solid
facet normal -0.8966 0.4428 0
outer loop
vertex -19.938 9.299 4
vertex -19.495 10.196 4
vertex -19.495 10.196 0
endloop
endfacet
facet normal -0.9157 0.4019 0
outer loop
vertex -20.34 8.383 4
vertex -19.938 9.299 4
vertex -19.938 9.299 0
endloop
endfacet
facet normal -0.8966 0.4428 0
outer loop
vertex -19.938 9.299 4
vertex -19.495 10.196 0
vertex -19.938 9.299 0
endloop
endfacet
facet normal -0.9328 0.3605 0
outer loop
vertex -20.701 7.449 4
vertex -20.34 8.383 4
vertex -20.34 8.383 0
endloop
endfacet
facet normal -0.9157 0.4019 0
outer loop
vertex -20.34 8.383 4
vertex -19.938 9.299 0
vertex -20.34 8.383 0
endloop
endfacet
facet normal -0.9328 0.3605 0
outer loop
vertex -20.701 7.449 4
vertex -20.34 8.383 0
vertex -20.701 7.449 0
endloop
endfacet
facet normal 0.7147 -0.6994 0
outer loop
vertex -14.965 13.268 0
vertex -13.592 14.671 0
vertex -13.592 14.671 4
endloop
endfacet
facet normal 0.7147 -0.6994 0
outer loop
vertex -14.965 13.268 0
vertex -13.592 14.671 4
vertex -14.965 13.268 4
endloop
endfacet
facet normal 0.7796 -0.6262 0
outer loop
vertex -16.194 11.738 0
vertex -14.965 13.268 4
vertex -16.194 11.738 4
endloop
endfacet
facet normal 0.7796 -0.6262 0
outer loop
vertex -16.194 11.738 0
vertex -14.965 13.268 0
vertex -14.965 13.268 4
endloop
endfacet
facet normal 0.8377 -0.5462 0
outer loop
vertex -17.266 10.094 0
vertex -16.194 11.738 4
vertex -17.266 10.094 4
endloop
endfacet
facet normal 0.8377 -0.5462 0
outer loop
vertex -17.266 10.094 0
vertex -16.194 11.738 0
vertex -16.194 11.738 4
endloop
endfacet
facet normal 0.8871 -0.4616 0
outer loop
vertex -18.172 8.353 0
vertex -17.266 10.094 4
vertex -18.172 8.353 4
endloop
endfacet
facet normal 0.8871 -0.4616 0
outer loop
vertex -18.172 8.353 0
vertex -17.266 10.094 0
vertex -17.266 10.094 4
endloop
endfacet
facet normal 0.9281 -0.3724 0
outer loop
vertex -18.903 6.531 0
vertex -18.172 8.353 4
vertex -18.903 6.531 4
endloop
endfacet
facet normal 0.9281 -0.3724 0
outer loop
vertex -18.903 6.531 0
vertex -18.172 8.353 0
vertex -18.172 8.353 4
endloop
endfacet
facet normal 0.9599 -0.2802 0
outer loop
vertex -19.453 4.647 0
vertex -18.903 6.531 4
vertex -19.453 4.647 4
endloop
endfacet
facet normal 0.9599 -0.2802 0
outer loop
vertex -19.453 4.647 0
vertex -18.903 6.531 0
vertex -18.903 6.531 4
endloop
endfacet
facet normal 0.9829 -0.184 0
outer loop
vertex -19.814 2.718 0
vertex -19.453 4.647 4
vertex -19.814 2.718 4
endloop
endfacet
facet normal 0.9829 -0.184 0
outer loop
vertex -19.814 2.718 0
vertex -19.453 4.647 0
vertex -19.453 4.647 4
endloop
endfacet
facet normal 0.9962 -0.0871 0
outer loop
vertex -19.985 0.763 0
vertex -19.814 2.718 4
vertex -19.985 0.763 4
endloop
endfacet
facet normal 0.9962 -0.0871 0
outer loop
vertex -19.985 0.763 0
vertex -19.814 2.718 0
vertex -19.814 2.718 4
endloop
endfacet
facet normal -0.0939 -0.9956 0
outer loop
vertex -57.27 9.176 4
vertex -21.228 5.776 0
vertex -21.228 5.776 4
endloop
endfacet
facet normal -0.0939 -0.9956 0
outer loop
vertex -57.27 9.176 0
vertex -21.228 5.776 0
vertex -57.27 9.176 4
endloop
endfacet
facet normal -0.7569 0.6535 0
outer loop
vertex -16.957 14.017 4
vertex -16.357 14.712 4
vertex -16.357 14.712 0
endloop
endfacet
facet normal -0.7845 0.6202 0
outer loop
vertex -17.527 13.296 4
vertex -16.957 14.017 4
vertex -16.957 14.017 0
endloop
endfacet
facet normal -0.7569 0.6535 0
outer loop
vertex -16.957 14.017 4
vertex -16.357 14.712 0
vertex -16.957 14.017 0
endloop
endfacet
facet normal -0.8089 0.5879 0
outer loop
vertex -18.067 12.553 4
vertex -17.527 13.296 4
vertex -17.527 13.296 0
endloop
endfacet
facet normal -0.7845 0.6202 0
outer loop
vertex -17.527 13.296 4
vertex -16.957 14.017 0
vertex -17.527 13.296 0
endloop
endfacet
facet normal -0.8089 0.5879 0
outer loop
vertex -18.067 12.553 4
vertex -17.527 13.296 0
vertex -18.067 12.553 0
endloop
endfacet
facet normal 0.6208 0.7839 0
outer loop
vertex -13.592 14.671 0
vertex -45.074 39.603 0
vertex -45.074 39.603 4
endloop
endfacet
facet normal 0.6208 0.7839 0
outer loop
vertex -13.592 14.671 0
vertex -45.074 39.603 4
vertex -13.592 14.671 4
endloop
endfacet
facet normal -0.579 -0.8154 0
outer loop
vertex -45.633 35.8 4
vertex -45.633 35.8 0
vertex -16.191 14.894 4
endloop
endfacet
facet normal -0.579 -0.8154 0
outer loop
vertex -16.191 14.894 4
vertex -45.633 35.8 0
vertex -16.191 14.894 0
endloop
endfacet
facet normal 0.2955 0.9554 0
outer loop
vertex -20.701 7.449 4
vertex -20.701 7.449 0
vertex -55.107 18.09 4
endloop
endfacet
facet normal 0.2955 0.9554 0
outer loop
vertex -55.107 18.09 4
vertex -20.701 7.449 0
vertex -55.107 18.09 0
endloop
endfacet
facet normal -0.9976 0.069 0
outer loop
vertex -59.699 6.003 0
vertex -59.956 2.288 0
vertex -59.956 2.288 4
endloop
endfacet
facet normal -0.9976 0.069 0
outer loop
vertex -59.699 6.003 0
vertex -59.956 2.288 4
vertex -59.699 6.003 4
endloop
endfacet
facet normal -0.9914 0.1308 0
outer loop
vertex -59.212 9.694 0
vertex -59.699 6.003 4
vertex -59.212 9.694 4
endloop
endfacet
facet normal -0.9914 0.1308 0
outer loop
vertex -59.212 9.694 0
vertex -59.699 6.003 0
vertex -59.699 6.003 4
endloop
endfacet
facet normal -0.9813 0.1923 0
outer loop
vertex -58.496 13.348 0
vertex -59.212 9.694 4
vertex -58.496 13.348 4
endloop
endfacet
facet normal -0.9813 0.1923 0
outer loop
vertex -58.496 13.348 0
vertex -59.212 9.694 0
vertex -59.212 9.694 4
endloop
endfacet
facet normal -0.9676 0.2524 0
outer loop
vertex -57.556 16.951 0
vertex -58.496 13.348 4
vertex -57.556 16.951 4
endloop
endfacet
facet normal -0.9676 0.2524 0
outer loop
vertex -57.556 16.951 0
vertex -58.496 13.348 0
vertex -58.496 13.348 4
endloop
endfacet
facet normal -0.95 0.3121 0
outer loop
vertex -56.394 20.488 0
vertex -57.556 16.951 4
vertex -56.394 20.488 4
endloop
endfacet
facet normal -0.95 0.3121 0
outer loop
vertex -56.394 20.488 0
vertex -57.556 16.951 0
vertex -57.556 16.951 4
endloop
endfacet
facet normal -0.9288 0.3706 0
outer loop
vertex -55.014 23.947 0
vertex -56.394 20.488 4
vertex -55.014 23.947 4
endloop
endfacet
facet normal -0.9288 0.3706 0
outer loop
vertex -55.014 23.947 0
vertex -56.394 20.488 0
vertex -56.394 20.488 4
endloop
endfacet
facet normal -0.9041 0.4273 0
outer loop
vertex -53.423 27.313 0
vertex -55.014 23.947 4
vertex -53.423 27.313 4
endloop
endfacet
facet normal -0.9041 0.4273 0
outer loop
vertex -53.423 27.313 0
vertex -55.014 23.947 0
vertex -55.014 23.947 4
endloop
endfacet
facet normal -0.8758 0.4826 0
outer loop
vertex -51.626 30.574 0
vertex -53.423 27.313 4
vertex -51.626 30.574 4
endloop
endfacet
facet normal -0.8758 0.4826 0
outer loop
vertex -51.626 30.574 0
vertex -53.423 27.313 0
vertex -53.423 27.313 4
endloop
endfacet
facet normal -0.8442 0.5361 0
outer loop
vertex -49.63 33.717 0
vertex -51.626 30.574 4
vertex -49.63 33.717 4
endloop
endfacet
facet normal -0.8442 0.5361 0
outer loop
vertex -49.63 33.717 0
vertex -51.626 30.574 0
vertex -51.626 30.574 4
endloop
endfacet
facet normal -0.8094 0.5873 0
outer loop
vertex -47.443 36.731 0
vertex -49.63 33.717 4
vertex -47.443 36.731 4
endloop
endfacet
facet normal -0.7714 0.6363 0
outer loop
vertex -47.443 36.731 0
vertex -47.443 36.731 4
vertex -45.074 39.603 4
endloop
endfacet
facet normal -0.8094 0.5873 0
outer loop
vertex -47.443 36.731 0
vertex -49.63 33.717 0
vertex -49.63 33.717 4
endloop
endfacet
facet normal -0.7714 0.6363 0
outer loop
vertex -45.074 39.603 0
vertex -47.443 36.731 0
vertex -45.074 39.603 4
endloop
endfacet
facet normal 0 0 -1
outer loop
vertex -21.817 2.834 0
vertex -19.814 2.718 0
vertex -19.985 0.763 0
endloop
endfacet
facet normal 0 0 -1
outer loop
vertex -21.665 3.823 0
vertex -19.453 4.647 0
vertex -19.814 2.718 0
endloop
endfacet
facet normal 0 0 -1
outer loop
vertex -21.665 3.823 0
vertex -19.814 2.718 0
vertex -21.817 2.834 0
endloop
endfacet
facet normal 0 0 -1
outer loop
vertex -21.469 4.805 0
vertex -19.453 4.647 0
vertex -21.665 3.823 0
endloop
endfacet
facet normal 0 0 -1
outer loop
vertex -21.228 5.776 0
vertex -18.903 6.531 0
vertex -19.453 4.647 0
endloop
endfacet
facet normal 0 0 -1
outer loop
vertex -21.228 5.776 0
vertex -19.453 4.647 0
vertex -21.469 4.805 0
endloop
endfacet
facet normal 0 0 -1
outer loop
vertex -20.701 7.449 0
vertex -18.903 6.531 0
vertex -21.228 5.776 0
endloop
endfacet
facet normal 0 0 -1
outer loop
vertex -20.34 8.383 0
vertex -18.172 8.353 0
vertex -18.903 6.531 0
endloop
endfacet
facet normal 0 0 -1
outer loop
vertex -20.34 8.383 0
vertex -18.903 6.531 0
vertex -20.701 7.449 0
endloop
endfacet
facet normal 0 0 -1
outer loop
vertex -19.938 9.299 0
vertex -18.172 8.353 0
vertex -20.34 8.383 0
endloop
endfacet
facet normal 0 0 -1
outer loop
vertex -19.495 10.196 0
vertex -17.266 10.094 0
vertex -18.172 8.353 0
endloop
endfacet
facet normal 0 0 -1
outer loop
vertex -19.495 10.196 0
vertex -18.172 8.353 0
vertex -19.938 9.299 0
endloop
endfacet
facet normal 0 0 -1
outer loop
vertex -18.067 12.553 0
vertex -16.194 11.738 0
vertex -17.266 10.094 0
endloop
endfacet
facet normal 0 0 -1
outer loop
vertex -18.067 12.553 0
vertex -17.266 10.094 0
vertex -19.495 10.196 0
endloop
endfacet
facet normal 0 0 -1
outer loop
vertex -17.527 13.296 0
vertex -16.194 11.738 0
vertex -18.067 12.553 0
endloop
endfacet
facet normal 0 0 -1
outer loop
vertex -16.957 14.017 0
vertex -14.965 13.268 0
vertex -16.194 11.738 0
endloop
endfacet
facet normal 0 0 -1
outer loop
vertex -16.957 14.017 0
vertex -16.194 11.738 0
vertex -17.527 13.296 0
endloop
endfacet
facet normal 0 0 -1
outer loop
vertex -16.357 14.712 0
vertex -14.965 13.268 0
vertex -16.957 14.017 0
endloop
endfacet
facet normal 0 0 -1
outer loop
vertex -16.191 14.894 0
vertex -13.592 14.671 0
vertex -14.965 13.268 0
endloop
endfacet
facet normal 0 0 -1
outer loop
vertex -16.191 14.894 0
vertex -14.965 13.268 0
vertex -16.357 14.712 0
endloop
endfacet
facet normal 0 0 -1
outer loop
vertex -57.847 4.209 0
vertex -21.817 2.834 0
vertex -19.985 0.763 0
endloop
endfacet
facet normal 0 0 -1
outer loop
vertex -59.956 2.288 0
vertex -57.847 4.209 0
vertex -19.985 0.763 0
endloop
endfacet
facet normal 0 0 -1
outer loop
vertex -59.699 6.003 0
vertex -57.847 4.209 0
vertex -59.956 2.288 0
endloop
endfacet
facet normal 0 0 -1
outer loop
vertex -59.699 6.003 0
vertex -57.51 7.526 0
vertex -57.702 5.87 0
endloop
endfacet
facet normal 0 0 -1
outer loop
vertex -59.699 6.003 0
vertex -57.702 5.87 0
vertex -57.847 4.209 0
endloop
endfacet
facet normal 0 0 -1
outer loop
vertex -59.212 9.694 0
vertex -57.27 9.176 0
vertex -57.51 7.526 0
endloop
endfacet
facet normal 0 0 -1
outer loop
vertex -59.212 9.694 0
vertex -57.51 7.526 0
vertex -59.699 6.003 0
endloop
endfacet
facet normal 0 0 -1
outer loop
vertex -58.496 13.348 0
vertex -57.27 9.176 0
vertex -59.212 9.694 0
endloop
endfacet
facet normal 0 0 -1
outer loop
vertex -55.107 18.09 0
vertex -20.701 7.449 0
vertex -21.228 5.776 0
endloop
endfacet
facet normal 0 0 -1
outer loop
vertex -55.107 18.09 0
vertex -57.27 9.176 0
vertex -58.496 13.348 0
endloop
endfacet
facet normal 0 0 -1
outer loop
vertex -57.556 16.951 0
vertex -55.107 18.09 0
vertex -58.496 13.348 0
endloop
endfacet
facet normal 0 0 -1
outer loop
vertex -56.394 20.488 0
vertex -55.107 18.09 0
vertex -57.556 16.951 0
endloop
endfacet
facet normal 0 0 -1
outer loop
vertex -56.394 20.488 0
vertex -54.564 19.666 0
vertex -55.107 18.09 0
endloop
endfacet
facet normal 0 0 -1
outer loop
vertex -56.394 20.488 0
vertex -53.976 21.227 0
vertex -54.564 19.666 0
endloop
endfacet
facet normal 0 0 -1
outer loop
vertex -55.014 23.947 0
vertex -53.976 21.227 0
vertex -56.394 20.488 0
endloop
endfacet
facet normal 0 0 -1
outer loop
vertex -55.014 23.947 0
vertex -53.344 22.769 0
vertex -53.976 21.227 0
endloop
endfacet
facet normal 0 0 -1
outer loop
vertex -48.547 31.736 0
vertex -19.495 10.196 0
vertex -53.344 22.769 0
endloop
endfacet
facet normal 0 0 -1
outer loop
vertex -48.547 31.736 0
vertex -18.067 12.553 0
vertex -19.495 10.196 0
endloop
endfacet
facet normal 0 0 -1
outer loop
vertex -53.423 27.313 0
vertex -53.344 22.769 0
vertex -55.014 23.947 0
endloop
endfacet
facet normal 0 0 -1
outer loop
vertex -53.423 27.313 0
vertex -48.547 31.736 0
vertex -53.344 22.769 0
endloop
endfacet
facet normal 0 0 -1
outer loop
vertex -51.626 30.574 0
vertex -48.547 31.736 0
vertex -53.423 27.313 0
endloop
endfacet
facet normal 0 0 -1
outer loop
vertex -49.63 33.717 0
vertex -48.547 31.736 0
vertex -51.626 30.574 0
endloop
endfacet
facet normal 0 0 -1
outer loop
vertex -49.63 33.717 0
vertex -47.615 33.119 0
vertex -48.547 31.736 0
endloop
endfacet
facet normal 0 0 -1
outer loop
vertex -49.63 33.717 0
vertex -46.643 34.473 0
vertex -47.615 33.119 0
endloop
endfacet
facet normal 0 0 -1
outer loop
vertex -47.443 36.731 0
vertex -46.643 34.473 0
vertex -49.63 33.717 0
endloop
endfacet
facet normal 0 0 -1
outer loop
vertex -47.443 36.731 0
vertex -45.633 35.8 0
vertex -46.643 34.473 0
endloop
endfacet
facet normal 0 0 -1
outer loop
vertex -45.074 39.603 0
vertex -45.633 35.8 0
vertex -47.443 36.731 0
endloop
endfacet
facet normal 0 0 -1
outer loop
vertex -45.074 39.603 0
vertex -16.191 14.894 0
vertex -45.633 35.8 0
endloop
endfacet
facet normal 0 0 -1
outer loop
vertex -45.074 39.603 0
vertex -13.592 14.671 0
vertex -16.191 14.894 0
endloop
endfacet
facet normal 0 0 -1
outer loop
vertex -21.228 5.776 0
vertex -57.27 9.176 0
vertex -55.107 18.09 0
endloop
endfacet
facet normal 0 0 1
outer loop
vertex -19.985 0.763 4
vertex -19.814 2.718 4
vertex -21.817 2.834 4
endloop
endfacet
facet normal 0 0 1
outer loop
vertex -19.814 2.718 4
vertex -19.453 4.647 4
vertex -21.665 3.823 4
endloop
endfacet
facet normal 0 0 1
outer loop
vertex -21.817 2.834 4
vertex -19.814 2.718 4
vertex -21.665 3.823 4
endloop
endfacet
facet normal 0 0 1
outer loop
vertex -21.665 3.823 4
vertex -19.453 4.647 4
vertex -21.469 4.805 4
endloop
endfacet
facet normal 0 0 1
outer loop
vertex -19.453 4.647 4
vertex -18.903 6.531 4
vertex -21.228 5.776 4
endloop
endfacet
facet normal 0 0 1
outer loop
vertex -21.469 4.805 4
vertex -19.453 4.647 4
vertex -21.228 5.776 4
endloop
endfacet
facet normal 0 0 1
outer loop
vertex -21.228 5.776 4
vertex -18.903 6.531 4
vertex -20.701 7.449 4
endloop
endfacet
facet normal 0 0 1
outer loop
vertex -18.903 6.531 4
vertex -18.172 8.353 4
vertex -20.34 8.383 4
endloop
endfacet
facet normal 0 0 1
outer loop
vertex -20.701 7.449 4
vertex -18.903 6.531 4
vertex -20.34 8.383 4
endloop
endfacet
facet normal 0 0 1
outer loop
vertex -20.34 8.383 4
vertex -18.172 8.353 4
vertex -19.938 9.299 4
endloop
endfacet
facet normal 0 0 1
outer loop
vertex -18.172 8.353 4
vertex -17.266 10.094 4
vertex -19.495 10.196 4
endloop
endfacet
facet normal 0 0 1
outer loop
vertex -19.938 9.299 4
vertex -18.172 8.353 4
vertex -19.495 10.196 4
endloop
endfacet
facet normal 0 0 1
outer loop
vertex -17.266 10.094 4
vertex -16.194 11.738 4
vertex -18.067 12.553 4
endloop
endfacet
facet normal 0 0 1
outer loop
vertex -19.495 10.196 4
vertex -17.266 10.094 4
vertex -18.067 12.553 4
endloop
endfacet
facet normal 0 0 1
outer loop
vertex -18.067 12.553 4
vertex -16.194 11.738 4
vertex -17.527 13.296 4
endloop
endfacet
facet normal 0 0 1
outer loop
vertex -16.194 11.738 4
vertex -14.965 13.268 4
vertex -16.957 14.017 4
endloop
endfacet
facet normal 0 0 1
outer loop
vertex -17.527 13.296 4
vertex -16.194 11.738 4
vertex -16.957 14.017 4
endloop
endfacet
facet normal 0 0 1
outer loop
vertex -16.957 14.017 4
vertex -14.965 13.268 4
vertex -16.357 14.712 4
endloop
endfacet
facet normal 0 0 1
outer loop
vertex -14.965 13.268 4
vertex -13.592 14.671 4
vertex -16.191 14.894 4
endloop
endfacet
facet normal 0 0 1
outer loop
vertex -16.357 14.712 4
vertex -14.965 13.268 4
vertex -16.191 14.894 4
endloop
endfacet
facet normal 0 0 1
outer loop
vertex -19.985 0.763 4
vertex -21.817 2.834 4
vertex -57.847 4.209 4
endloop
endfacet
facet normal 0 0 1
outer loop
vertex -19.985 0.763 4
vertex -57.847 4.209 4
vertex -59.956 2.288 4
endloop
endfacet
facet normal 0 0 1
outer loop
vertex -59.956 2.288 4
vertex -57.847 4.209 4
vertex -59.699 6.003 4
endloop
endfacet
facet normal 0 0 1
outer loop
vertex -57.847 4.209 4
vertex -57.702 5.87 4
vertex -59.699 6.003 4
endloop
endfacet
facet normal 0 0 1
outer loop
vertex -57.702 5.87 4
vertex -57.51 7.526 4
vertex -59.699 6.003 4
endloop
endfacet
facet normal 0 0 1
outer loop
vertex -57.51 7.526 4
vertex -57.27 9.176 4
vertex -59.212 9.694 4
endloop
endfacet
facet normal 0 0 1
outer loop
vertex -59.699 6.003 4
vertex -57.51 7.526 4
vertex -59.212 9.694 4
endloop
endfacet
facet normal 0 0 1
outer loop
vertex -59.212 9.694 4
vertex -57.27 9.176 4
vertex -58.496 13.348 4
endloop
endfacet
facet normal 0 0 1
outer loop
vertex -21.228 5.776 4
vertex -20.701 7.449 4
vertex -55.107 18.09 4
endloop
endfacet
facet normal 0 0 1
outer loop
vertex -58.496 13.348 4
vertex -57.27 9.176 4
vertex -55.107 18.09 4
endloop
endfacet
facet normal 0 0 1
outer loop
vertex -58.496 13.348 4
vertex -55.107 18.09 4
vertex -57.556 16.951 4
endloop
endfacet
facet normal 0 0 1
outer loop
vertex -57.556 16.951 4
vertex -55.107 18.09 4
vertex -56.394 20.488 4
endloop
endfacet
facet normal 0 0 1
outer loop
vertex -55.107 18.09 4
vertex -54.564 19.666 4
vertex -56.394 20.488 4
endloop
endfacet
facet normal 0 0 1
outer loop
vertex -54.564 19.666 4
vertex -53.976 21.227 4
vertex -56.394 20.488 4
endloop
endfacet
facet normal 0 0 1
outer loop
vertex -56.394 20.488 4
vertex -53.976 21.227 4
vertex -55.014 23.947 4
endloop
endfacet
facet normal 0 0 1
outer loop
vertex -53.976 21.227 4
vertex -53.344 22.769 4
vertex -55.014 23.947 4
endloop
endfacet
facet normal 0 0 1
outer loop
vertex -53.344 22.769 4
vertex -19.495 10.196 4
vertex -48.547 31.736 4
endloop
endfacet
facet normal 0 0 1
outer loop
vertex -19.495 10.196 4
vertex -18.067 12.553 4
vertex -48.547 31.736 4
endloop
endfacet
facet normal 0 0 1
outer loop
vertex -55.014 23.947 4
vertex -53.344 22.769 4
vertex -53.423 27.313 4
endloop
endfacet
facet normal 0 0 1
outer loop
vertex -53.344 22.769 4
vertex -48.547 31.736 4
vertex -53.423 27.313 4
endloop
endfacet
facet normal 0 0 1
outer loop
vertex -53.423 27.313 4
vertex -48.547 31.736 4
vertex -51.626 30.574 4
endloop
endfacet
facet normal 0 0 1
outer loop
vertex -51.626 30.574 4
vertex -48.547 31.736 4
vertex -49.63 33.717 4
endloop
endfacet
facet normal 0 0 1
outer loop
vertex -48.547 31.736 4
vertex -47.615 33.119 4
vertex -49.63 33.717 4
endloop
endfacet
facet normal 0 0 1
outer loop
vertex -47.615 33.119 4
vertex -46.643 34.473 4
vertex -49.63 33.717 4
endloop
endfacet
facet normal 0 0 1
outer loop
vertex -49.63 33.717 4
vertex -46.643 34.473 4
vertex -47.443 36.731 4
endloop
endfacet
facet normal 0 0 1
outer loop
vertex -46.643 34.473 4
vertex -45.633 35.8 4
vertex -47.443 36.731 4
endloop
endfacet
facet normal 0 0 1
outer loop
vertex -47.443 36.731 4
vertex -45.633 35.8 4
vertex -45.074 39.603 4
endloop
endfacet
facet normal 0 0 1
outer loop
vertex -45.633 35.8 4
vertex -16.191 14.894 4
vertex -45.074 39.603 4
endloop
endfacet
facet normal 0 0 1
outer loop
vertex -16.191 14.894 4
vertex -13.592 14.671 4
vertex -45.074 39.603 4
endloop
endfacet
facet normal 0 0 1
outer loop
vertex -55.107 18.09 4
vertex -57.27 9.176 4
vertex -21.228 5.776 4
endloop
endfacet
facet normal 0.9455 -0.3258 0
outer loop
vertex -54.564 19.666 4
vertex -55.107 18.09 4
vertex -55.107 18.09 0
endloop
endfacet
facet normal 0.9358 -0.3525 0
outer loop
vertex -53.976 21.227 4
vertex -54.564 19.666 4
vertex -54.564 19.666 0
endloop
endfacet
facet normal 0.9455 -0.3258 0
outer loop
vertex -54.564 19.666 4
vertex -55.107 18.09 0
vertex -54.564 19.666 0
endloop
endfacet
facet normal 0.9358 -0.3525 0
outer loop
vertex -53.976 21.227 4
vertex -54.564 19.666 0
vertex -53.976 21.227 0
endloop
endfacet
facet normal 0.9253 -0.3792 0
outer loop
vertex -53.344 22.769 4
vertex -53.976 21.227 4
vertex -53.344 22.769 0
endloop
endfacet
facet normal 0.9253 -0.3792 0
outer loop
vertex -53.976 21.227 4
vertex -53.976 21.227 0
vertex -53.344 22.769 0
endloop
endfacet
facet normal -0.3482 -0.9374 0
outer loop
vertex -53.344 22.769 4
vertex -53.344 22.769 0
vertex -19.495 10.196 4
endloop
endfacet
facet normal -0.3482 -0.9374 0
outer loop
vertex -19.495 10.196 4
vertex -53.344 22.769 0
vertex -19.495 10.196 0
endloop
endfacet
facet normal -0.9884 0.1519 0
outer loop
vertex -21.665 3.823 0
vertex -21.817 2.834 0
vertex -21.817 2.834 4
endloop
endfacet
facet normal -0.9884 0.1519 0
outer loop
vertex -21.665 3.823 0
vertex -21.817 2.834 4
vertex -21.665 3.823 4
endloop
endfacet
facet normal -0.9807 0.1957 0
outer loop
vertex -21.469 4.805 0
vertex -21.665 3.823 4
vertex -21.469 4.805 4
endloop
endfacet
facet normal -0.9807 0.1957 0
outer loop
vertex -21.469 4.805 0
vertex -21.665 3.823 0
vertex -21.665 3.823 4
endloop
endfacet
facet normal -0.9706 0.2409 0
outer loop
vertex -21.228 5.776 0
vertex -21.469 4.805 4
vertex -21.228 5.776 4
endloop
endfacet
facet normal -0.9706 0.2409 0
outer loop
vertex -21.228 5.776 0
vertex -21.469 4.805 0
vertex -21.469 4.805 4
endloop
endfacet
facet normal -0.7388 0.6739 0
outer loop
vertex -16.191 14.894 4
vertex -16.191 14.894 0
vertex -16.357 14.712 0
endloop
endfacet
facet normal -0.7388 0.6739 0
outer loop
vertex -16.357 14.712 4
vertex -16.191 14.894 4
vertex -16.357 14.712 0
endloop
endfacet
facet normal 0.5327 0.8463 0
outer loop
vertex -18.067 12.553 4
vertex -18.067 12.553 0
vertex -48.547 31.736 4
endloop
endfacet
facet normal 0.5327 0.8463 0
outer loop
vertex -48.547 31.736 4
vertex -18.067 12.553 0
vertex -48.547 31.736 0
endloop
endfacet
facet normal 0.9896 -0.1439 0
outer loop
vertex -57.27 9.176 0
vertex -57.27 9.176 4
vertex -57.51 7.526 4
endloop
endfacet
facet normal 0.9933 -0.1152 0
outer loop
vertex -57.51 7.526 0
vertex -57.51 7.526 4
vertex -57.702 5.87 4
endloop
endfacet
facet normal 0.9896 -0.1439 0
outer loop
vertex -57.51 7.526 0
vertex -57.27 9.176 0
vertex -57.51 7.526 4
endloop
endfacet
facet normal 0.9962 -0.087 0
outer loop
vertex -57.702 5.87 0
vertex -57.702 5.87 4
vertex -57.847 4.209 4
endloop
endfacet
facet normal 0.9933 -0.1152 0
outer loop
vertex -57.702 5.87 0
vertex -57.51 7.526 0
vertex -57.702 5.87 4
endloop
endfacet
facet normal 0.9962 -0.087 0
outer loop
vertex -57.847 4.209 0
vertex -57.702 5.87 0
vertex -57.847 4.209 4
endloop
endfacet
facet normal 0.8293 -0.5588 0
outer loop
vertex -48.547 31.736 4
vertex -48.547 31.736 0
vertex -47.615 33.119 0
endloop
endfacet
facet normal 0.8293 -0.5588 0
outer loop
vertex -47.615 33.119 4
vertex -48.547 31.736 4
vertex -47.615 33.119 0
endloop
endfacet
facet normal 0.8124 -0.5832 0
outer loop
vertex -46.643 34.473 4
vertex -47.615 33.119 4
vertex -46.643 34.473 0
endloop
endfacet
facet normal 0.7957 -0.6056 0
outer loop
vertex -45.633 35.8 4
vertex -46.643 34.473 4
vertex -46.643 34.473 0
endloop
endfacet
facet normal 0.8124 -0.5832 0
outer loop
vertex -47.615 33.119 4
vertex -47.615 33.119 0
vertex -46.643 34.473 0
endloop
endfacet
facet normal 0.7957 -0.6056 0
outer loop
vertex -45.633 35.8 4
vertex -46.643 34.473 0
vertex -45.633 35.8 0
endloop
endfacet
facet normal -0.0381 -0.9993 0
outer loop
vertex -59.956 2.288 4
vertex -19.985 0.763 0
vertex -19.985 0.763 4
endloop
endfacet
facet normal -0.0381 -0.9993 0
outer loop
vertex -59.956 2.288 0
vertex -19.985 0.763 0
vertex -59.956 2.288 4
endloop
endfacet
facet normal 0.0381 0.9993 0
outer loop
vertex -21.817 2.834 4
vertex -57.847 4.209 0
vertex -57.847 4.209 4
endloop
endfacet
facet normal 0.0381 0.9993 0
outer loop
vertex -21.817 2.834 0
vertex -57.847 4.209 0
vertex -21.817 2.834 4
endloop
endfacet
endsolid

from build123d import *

# Parameters (mm, degrees)
BOSS_EXTRUDE2_DEPTH = 4
CUT_EXTRUDE1_DEPTH  = 72.966153215


with BuildPart() as part:
    # Sketch1 → Boss-Extrude2 (new body)
    with BuildSketch(Plane.XY):
        with BuildLine():
            Line((-19.985447982, 0.762803358), (-59.956343946, 2.288410074))
            ThreePointArc((-59.956343946, 2.288410074), (-55.730717245, 22.228071336), (-45.073672701, 39.602576043))
            Line((-45.073672701, 39.602576043), (-13.592462366, 14.67122922))
            ThreePointArc((-13.592462366, 14.67122922), (-18.172234131, 8.352838241), (-19.985447982, 0.762803358))
        make_face()
    extrude(amount=BOSS_EXTRUDE2_DEPTH)

    # Sketch1<5> → Cut-Extrude1 (cut, through all)
    with BuildSketch(Plane.XY):
        with BuildLine():
            ThreePointArc((-18.067243214, 12.552877066), (-17.245912522, 13.659374118), (-16.356919422, 14.712280144))
            Line((-16.356919422, 14.712280144), (-16.19149009, 14.894148135))
            Line((-16.19149009, 14.894148135), (-45.633154018, 35.799654388))
            ThreePointArc((-45.633154018, 35.799654388), (-47.133831778, 33.799436415), (-48.546898537, 31.736393028))
            Line((-48.546898537, 31.736393028), (-18.067243214, 12.552877066))
        make_face()
        with BuildLine():
            Line((-57.847050894, 4.209358967), (-21.816681027, 2.834154011))
            ThreePointArc((-21.816681027, 2.834154011), (-21.572673921, 4.315059664), (-21.2282638, 5.775882272))
            Line((-21.2282638, 5.775882272), (-57.269563461, 9.175897829))
            ThreePointArc((-57.269563461, 9.175897829), (-57.611850796, 6.698854216), (-57.847050894, 4.209358967))
        make_face()
        with BuildLine():
            Line((-55.106686022, 18.090139737), (-20.700540486, 7.449001516))
            ThreePointArc((-20.700540486, 7.449001516), (-20.144482043, 8.843067523), (-19.494667642, 10.19597634))
            Line((-19.494667642, 10.19597634), (-53.343874365, 22.769081398))
            ThreePointArc((-53.343874365, 22.769081398), (-54.275723264, 20.448615214), (-55.106686022, 18.090139737))
        make_face()
    extrude(amount=CUT_EXTRUDE1_DEPTH, mode=Mode.SUBTRACT)


solid = part.part
